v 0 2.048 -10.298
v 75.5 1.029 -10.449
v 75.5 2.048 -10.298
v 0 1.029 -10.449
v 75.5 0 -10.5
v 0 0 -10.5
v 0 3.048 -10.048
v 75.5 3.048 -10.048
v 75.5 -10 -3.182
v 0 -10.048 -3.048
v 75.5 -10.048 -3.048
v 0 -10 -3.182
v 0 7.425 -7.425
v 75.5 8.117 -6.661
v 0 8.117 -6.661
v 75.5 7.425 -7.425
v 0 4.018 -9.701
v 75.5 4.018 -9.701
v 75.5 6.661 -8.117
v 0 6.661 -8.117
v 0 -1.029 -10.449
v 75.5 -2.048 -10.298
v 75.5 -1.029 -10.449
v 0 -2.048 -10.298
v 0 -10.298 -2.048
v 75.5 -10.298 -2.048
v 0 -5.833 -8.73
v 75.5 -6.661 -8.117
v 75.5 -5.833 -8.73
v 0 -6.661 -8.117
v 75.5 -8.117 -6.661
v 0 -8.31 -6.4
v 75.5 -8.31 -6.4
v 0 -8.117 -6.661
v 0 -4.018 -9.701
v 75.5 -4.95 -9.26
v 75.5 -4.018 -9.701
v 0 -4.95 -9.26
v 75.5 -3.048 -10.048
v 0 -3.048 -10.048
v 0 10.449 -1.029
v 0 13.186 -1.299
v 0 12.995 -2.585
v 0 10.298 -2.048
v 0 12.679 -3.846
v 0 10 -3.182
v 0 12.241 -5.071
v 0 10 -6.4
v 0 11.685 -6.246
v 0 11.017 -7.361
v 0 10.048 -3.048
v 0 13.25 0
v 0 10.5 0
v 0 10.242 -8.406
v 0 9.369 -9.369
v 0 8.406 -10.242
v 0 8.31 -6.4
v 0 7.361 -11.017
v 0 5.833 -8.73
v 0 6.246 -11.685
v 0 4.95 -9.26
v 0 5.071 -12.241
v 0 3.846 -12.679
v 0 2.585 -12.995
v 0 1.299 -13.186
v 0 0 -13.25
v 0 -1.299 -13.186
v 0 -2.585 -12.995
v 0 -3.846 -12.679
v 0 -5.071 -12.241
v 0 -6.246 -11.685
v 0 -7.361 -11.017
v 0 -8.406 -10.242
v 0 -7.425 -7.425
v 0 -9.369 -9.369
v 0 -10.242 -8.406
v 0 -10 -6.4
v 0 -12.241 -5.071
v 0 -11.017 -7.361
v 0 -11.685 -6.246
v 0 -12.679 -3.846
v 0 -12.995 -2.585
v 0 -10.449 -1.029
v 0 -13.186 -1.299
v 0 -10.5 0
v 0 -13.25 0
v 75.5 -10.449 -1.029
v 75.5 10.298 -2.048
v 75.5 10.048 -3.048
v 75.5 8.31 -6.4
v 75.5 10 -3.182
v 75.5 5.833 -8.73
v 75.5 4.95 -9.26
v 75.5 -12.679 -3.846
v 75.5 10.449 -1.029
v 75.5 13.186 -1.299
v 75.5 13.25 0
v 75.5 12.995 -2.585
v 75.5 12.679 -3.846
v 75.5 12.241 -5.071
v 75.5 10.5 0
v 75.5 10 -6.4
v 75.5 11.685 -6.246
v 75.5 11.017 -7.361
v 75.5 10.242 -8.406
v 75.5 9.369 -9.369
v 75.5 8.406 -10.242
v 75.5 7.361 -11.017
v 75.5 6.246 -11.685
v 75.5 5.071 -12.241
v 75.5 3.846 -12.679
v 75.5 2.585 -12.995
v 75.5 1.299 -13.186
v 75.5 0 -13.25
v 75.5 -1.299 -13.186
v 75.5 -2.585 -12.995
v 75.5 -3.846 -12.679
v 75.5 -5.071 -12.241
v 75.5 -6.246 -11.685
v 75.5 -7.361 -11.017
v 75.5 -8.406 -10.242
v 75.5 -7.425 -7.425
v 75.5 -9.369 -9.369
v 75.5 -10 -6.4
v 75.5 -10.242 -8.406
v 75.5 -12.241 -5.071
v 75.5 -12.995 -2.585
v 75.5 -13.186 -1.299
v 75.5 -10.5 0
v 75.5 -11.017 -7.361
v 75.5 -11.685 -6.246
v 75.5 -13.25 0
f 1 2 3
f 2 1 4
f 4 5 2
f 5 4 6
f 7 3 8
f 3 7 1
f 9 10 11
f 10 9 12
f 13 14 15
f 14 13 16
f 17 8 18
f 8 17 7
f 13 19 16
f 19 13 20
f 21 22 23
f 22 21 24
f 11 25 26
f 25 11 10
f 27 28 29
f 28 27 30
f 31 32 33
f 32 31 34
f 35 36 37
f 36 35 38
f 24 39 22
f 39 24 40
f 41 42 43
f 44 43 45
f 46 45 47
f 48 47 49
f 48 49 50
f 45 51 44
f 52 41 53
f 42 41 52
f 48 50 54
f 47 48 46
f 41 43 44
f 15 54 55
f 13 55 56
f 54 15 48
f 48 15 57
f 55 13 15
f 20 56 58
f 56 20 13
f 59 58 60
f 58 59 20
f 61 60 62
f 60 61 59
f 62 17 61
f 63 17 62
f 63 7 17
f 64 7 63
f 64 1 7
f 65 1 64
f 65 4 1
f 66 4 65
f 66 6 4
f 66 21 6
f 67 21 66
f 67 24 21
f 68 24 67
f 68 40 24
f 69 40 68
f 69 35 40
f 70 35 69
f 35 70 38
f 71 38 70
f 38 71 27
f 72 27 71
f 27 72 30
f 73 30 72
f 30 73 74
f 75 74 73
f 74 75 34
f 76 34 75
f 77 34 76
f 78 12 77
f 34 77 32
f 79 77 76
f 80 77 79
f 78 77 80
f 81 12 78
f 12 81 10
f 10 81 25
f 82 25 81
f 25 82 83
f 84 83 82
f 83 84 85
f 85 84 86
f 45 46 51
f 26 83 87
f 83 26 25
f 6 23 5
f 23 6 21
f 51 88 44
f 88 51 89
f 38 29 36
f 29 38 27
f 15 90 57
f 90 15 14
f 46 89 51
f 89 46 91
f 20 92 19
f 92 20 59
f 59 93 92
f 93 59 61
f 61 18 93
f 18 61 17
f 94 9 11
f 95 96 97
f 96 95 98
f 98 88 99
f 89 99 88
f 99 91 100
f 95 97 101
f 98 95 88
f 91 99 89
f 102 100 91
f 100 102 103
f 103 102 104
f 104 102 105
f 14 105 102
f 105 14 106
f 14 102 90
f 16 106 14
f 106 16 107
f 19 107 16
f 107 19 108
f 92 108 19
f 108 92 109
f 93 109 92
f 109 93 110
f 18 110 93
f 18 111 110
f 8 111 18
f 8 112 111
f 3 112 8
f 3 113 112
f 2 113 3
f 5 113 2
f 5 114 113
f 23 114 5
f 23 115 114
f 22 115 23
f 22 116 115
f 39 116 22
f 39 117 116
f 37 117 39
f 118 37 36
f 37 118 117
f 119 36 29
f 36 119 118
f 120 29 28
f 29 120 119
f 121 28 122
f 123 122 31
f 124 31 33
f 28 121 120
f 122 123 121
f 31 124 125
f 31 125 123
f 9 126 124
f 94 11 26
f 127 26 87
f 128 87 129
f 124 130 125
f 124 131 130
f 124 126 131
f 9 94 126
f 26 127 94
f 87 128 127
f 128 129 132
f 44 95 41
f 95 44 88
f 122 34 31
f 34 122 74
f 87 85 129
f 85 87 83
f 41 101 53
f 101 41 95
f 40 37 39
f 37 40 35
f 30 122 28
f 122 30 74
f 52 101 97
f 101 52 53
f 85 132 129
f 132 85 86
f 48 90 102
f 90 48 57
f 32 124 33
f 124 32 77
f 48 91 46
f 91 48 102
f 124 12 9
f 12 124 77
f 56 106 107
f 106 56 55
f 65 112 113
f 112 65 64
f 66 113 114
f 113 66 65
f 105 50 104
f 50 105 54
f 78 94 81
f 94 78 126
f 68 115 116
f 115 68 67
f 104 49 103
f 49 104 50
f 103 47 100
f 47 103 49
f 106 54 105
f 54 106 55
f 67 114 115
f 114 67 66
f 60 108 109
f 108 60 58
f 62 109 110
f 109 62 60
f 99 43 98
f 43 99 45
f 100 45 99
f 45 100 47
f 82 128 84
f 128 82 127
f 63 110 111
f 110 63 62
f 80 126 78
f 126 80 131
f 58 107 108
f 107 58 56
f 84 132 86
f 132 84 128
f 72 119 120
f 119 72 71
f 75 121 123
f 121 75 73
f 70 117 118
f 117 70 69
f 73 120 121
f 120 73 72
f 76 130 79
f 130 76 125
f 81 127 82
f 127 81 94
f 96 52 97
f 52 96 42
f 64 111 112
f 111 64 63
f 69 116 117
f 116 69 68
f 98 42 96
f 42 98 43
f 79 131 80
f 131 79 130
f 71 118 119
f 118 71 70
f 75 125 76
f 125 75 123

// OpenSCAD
$fn=64;

length=75.5;

rotate([0, 90, 0]) {
  difference() {
    cylinder(h=length, r=13.25);
    union() {
      cylinder(h=length, r=10.5);
      translate([-13.25, -13.25, 0]) cube([13.25, 26.5, length]);
      
      // Battery.
      translate([0, -10, 0]) cube([6.4, 20, length]);
    }
  }

//  difference() {
//    translate([7, -12.5, 0]) cube([3, 25, length]);
//    union() {
//      difference() {
//        cylinder(h=length, r=16.5);
//        cylinder(h=length, r=13.5);
//      }
//    }
//  }
}
